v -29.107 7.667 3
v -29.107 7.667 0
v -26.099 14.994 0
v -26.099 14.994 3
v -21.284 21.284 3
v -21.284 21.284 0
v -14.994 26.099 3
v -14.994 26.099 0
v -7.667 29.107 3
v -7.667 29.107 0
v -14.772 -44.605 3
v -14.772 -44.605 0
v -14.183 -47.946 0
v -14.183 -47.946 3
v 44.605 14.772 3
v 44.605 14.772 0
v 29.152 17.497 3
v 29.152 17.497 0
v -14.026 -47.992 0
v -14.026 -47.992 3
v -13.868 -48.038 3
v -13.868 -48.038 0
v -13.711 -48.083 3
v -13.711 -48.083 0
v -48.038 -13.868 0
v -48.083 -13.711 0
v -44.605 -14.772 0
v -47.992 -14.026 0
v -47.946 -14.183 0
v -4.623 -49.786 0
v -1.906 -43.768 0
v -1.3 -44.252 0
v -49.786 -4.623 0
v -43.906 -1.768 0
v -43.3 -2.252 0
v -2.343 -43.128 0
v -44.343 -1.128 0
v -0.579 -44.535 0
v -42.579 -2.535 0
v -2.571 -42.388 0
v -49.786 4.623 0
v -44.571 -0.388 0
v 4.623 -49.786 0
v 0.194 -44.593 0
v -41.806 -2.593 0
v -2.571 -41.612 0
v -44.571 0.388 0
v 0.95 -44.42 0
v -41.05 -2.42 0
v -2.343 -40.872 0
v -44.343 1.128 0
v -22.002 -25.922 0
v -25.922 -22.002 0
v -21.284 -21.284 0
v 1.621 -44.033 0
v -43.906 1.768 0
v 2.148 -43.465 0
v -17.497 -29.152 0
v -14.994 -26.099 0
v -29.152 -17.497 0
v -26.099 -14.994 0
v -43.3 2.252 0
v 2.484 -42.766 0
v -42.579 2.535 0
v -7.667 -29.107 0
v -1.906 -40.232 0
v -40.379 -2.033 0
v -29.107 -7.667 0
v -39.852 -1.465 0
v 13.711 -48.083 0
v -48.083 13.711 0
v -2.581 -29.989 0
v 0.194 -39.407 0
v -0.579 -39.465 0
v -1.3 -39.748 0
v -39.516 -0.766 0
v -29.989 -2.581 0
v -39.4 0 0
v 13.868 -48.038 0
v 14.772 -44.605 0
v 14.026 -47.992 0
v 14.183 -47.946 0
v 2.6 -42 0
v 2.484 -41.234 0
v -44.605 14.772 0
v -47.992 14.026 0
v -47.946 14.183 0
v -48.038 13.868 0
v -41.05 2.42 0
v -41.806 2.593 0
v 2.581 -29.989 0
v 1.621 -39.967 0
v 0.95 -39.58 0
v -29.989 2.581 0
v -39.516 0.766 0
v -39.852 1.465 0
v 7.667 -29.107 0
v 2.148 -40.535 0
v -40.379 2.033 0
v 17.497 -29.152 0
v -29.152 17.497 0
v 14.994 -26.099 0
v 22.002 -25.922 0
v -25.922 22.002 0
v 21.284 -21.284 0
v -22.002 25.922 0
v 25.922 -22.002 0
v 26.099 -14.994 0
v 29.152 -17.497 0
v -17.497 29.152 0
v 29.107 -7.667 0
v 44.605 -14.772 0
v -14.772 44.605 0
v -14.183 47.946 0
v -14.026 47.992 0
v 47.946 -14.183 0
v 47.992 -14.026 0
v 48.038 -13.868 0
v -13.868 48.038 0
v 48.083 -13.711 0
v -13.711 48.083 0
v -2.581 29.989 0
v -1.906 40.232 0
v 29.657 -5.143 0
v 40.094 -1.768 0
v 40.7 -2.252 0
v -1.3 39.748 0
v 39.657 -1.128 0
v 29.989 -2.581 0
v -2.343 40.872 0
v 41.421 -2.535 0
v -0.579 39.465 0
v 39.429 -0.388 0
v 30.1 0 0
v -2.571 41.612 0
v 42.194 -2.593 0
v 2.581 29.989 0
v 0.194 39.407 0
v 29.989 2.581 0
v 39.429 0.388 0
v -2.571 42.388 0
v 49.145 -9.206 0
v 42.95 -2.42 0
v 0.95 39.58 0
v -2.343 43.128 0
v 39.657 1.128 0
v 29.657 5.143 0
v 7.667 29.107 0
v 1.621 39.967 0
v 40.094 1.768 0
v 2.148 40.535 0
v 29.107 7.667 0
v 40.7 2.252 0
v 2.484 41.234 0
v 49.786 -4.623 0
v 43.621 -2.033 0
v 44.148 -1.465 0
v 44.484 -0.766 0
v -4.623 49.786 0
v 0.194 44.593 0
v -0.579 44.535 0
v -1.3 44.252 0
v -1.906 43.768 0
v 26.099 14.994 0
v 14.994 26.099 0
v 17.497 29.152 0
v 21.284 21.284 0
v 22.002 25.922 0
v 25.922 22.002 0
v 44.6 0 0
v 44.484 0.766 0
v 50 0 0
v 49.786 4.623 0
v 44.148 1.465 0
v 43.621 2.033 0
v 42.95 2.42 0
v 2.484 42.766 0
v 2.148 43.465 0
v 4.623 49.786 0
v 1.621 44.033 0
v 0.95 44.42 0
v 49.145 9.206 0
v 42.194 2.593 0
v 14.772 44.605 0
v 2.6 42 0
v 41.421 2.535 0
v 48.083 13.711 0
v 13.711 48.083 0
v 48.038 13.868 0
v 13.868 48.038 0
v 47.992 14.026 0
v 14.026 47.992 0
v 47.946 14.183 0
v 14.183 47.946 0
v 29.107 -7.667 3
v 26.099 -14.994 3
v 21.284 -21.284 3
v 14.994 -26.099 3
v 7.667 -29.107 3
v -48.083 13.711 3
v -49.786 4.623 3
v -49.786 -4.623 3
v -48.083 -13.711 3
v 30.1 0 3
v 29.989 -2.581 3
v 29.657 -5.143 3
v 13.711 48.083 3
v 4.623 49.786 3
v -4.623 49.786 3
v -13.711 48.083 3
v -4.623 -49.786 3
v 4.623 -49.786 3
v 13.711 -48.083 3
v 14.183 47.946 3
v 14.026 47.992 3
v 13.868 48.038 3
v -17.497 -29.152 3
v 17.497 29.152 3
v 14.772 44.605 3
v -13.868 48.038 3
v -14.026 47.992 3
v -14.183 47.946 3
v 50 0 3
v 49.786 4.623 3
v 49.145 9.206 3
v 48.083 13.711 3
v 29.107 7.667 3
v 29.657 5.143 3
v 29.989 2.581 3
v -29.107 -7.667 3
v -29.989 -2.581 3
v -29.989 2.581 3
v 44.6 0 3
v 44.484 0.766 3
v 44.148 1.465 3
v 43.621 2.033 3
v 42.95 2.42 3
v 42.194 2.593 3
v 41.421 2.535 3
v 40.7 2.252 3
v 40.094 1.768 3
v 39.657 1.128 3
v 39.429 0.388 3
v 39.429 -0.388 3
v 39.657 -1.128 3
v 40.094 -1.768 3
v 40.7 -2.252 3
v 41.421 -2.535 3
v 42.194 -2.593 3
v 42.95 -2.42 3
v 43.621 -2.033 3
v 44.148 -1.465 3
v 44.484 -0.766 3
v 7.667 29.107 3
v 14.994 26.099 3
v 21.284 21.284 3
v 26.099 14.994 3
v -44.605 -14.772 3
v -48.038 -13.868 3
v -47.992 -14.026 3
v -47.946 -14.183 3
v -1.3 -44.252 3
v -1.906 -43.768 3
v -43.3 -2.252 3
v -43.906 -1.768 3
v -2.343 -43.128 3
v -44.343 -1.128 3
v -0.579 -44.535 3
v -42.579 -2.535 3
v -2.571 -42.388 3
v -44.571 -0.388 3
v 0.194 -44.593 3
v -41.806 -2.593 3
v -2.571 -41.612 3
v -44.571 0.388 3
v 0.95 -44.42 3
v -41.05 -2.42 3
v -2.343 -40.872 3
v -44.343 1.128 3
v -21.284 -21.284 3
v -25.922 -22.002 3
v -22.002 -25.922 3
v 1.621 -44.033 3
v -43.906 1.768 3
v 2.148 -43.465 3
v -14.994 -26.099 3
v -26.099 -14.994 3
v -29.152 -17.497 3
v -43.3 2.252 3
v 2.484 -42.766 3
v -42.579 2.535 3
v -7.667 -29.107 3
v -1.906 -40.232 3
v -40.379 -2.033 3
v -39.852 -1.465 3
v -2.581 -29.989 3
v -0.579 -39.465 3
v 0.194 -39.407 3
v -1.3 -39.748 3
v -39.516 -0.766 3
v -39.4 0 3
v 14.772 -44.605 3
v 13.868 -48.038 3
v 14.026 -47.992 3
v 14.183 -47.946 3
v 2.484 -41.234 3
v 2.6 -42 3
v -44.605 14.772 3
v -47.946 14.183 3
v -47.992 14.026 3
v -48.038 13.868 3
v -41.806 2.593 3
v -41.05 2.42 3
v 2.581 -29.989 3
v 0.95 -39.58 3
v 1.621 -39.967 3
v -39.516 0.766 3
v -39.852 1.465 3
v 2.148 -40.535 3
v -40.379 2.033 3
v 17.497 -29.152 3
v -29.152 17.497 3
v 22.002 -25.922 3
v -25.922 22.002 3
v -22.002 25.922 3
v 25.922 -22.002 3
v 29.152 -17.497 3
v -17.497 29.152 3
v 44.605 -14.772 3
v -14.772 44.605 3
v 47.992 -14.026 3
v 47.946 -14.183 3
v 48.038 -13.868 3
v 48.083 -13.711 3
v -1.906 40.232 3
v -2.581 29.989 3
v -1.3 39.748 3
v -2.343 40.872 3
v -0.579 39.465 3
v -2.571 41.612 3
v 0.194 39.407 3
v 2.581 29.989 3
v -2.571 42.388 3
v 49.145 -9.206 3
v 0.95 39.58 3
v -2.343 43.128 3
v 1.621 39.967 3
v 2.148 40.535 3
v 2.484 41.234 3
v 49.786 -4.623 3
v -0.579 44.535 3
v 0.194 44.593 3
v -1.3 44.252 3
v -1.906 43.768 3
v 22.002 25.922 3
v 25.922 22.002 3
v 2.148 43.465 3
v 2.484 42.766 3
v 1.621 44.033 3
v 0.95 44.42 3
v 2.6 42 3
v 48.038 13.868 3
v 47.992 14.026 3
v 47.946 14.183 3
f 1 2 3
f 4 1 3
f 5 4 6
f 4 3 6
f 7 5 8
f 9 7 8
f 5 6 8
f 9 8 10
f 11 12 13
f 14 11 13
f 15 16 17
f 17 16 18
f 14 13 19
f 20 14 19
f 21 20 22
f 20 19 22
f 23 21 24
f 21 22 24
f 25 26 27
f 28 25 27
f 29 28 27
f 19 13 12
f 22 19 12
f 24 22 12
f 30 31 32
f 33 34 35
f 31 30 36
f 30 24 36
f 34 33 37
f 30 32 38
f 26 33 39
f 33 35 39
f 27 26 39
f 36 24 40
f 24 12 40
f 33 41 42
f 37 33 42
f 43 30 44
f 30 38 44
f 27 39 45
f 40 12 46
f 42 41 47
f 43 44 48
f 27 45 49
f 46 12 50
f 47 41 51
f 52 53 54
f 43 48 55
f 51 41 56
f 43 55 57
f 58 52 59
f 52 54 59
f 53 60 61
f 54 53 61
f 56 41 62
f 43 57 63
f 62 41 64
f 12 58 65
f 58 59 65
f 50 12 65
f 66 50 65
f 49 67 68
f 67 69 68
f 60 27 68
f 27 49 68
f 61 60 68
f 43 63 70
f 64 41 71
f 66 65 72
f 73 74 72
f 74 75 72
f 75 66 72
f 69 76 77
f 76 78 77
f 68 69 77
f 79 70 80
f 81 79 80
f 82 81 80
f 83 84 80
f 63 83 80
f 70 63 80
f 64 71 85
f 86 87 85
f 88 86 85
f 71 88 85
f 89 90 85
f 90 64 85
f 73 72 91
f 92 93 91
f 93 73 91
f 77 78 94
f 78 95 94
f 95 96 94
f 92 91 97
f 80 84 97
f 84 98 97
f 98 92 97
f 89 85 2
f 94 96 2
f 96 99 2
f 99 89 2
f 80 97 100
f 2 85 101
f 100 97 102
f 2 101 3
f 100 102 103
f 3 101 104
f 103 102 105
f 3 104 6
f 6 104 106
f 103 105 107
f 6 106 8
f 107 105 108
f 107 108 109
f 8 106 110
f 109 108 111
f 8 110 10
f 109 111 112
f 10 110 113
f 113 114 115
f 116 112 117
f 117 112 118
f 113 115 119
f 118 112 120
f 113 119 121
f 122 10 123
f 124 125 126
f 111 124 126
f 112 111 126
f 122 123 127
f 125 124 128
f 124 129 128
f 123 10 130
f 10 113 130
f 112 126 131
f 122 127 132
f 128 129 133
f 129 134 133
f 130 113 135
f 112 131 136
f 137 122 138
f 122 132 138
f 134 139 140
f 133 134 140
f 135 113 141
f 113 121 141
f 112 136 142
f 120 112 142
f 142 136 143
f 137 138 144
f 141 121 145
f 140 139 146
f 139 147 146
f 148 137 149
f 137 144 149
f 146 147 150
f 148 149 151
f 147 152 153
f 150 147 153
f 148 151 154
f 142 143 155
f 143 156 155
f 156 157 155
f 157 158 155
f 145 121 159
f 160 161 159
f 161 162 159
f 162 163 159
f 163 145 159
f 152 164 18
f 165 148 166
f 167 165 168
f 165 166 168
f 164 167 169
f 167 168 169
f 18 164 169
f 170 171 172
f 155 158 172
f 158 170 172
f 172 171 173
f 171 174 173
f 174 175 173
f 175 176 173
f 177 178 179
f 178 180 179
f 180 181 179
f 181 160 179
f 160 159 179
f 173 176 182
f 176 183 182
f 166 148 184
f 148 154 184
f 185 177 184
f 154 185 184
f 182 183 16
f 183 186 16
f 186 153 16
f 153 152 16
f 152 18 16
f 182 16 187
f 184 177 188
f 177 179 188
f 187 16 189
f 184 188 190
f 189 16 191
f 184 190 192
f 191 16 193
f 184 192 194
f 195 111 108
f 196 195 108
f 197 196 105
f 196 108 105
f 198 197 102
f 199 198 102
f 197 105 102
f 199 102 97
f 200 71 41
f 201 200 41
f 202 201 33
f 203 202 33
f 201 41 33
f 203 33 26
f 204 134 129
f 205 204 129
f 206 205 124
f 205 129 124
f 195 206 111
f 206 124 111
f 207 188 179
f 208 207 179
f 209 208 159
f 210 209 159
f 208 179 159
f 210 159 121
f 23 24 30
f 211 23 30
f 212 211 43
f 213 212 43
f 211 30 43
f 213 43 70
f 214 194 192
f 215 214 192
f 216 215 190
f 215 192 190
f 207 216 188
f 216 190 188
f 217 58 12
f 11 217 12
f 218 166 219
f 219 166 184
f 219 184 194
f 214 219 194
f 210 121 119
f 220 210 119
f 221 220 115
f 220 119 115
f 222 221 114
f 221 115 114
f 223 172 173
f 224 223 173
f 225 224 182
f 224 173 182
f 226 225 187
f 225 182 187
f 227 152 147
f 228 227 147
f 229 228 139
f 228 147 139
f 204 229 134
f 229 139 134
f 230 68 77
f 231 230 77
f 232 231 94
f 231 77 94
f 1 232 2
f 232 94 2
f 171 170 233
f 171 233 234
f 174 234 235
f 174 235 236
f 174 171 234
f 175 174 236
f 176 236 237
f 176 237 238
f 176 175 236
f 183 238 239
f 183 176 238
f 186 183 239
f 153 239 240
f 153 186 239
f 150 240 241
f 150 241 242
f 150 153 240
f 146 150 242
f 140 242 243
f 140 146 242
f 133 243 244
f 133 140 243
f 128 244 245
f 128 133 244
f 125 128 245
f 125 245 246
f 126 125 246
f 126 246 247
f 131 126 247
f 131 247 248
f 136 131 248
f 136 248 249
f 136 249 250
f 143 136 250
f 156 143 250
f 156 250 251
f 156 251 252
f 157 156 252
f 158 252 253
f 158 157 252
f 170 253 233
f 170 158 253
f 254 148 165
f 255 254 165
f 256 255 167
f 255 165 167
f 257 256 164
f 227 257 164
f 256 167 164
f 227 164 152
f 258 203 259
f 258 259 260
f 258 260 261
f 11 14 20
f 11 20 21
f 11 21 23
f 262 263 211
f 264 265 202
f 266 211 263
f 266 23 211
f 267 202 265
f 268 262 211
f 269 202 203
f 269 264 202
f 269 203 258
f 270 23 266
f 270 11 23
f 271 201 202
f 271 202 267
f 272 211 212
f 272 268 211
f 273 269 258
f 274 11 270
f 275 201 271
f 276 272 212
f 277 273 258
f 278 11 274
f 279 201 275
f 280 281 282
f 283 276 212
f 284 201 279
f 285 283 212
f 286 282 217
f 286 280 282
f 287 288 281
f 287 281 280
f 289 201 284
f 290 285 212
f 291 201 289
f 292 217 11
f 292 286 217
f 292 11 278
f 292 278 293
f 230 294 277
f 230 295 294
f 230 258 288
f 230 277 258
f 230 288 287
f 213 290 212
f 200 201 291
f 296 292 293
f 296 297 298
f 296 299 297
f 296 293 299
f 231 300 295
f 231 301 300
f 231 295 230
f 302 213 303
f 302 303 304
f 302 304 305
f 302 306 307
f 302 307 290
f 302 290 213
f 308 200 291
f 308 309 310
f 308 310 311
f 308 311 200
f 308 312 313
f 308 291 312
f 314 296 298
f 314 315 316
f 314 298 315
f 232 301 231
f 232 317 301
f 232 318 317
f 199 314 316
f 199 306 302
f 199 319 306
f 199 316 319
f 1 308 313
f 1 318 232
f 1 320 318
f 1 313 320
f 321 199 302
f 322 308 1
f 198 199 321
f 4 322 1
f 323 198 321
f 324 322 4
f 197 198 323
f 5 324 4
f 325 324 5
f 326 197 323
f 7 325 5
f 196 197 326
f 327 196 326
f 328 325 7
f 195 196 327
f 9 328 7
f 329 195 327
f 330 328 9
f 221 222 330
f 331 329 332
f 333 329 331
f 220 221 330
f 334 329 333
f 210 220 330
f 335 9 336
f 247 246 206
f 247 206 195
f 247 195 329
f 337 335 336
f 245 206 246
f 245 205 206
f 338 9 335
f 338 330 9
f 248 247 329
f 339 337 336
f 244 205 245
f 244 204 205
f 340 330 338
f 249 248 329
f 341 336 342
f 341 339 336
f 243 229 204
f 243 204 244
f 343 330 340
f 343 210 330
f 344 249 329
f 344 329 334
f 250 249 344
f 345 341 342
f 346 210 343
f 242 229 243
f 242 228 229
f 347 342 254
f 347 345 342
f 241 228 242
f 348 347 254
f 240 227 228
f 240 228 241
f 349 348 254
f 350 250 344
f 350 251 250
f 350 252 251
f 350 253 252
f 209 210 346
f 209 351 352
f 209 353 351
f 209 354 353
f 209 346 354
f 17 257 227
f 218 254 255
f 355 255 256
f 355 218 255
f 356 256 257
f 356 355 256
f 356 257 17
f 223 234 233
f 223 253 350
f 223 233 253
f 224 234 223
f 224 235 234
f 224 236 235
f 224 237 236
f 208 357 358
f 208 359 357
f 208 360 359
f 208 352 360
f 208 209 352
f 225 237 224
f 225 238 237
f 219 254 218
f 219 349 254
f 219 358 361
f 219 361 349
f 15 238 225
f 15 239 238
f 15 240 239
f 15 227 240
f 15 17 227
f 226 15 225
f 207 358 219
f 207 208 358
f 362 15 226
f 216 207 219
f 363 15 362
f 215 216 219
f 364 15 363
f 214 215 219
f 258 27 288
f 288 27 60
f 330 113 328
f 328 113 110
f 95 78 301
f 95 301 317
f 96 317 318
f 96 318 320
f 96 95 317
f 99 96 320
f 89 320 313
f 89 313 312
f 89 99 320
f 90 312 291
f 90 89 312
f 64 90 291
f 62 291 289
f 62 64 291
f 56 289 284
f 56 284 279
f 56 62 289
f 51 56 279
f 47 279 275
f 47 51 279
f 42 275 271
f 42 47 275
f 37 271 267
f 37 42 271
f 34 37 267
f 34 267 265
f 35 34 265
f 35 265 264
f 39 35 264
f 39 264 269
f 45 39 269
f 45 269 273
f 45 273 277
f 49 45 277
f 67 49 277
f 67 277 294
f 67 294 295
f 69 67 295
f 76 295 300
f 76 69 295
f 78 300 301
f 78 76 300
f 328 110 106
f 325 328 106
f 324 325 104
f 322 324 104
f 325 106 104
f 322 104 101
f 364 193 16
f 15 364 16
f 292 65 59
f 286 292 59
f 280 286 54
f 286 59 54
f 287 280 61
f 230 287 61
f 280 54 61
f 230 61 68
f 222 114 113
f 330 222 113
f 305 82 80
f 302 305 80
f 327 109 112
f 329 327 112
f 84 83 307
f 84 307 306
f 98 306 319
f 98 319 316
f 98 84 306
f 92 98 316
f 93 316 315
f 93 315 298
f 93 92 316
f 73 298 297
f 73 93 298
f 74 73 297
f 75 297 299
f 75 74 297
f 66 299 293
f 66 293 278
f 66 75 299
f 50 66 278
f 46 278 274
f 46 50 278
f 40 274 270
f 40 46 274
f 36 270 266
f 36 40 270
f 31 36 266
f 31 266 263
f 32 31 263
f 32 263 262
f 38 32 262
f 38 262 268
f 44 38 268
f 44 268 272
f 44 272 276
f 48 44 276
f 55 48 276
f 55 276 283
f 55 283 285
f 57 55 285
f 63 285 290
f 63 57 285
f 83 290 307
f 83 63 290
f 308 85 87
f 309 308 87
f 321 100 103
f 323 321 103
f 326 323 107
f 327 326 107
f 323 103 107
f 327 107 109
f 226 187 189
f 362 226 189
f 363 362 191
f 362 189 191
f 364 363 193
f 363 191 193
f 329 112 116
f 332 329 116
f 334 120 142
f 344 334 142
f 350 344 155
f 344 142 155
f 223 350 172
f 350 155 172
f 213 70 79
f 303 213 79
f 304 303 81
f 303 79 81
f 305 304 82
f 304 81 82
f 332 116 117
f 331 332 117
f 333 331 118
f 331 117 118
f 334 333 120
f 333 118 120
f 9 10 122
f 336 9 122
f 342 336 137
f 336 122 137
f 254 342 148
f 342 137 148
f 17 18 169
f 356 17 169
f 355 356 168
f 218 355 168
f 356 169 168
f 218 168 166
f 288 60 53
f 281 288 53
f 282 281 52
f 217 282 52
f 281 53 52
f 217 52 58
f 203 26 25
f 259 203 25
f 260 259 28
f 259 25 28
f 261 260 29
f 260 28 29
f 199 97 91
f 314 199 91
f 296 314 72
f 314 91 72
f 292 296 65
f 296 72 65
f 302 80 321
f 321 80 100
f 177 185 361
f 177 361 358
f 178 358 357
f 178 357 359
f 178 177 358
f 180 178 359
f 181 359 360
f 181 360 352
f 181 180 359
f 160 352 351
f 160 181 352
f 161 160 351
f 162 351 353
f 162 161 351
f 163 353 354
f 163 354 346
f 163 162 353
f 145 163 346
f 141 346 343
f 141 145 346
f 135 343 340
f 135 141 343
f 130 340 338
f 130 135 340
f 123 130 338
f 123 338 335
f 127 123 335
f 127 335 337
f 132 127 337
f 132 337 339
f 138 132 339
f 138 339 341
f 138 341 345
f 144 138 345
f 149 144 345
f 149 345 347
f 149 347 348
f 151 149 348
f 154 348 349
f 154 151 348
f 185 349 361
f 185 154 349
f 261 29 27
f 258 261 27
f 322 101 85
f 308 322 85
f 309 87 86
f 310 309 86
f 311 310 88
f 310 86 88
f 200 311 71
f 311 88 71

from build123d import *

# Parameters (mm, degrees)
F0_R     = 2.6
F1_DEPTH = 3


with BuildPart() as f1:
    # F0 (on Top) → F1 (new body)
    with BuildSketch(Plane.XY):
        with BuildLine():
            ThreePointArc((-29.1072619048, 7.6666357946), (-21.2839141137, 21.2839141137), (-7.6666357946, 29.1072619048))
            ThreePointArc((-7.6666357946, 29.1072619048), (-9.5767893278, 30.4550831025), (-11.2543201582, 32.0833333333))
            ThreePointArc((-11.2543201582, 32.0833333333), (-14.4500509711, 30.7765499518), (-17.4967765305, 29.1524066081))
            ThreePointArc((-17.4967765305, 29.1524066081), (-24.0416305603, 24.0416305603), (-29.1524066081, 17.4967765305))
            ThreePointArc((-29.1524066081, 17.4967765305), (-30.7765499518, 14.4500509711), (-32.0833333333, 11.2543201582))
            ThreePointArc((-32.0833333333, 11.2543201582), (-30.4550831025, 9.5767893278), (-29.1072619048, 7.6666357946))
        make_face()
        with BuildLine():
            ThreePointArc((-17.4967765305, 29.1524066081), (-14.4500509711, 30.7765499518), (-11.2543201582, 32.0833333333))
            ThreePointArc((-11.2543201582, 32.0833333333), (-14.4409191932, 37.9429255793), (-14.7721162582, 44.6047228746))
            Line((-14.7721162582, 44.6047228746), (-17.4967765305, 29.1524066081))
        make_face()
        with BuildLine():
            ThreePointArc((-11.2543201582, 32.0833333333), (0, 34), (11.2543201582, 32.0833333333))
            ThreePointArc((11.2543201582, 32.0833333333), (14.0323697637, 36.6997548346), (15, 42))
            ThreePointArc((15, 42), (14.942920488, 43.3073359512), (14.7721163614, 44.6047222892))
            ThreePointArc((14.7721163614, 44.6047222892), (14.3474025552, 46.3763043677), (13.7110559606, 48.0833333333))
            ThreePointArc((13.7110559606, 48.0833333333), (0, 50), (-13.7110559606, 48.0833333333))
            ThreePointArc((-13.7110559606, 48.0833333333), (-14.3474024685, 46.376304652), (-14.7721162582, 44.6047228746))
            ThreePointArc((-14.7721162582, 44.6047228746), (-14.4409191932, 37.9429255793), (-11.2543201582, 32.0833333333))
        make_face()
        with Locations((0, 42)):
            Circle(F0_R, mode=Mode.SUBTRACT)
        with BuildLine():
            ThreePointArc((15, 42), (14.0323697637, 36.6997548346), (11.2543201582, 32.0833333333))
            ThreePointArc((11.2543201582, 32.0833333333), (14.4500509711, 30.7765499518), (17.4967765305, 29.1524066081))
            Line((17.4967765305, 29.1524066081), (14.7721163614, 44.6047222892))
            ThreePointArc((14.7721163614, 44.6047222892), (14.942920488, 43.3073359512), (15, 42))
        make_face()
        with BuildLine():
            ThreePointArc((-7.6666357946, 29.1072619048), (0, 30.1), (7.6666357946, 29.1072619048))
            ThreePointArc((7.6666357946, 29.1072619048), (9.5767893278, 30.4550831025), (11.2543201582, 32.0833333333))
            ThreePointArc((11.2543201582, 32.0833333333), (0, 34), (-11.2543201582, 32.0833333333))
            ThreePointArc((-11.2543201582, 32.0833333333), (-9.5767893278, 30.4550831025), (-7.6666357946, 29.1072619048))
        make_face()
        with BuildLine():
            ThreePointArc((7.6666357946, 29.1072619048), (21.2839141137, 21.2839141137), (29.1072619048, 7.6666357946))
            ThreePointArc((29.1072619048, 7.6666357946), (30.4550831025, 9.5767893278), (32.0833333333, 11.2543201582))
            ThreePointArc((32.0833333333, 11.2543201582), (30.7765499518, 14.4500509711), (29.1524066081, 17.4967765305))
            ThreePointArc((29.1524066081, 17.4967765305), (24.0416305603, 24.0416305603), (17.4967765305, 29.1524066081))
            ThreePointArc((17.4967765305, 29.1524066081), (14.4500509711, 30.7765499518), (11.2543201582, 32.0833333333))
            ThreePointArc((11.2543201582, 32.0833333333), (9.5767893278, 30.4550831025), (7.6666357946, 29.1072619048))
        make_face()
        with BuildLine():
            ThreePointArc((29.1524066081, 17.4967765305), (30.7765499518, 14.4500509711), (32.0833333333, 11.2543201582))
            ThreePointArc((32.0833333333, 11.2543201582), (37.9429254774, 14.4409191646), (44.6047226662, 14.772116295))
            Line((44.6047226662, 14.772116295), (29.1524066081, 17.4967765305))
        make_face()
        with BuildLine():
            ThreePointArc((44.6047226662, 14.772116295), (37.9429254774, 14.4409191646), (32.0833333333, 11.2543201582))
            ThreePointArc((32.0833333333, 11.2543201582), (33.5174084121, 5.7081812632), (34, 0))
            ThreePointArc((34, 0), (33.5174084121, -5.7081812632), (32.0833333333, -11.2543201582))
            ThreePointArc((32.0833333333, -11.2543201582), (37.9429254774, -14.4409191646), (44.6047226662, -14.772116295))
            ThreePointArc((44.6047226662, -14.772116295), (46.3763045508, -14.3474024994), (48.0833333333, -13.7110559606))
            ThreePointArc((48.0833333333, -13.7110559606), (49.5185150558, -6.9221865524), (50, 0))
            ThreePointArc((50, 0), (49.5185150558, 6.9221865524), (48.0833333333, 13.7110559606))
            ThreePointArc((48.0833333333, 13.7110559606), (46.3763045508, 14.3474024994), (44.6047226662, 14.772116295))
        make_face()
        with Locations((42, 0)):
            Circle(F0_R, mode=Mode.SUBTRACT)
        with BuildLine():
            Line((-14.182910918, 47.9462724087), (-14.7721162582, 44.6047228746))
            ThreePointArc((-14.7721162582, 44.6047228746), (-14.3474024685, 46.376304652), (-13.7110559606, 48.0833333333))
            ThreePointArc((-13.7110559606, 48.0833333333), (-13.9471518053, 48.0153824989), (-14.182910918, 47.9462724087))
        make_face()
        with BuildLine():
            ThreePointArc((13.7110559606, 48.0833333333), (14.3474025552, 46.3763043677), (14.7721163614, 44.6047222892))
            Line((14.7721163614, 44.6047222892), (14.182910918, 47.9462724087))
            ThreePointArc((14.182910918, 47.9462724087), (13.9471518053, 48.0153824989), (13.7110559606, 48.0833333333))
        make_face()
        with BuildLine():
            ThreePointArc((44.6047226662, -14.772116295), (37.9429254774, -14.4409191646), (32.0833333333, -11.2543201582))
            ThreePointArc((32.0833333333, -11.2543201582), (30.7765499518, -14.4500509711), (29.1524066081, -17.4967765305))
            Line((29.1524066081, -17.4967765305), (44.6047226662, -14.772116295))
        make_face()
        with BuildLine():
            ThreePointArc((32.0833333333, -11.2543201582), (30.4550831025, -9.5767893278), (29.1072619048, -7.6666357946))
            ThreePointArc((29.1072619048, -7.6666357946), (21.2839141137, -21.2839141137), (7.6666357946, -29.1072619048))
            ThreePointArc((7.6666357946, -29.1072619048), (9.5767893278, -30.4550831025), (11.2543201582, -32.0833333333))
            ThreePointArc((11.2543201582, -32.0833333333), (14.4500509711, -30.7765499518), (17.4967765305, -29.1524066081))
            ThreePointArc((17.4967765305, -29.1524066081), (24.0416305603, -24.0416305603), (29.1524066081, -17.4967765305))
            ThreePointArc((29.1524066081, -17.4967765305), (30.7765499518, -14.4500509711), (32.0833333333, -11.2543201582))
        make_face()
        with BuildLine():
            ThreePointArc((29.1072619048, 7.6666357946), (29.8507837697, 3.8653212458), (30.1, 0))
            ThreePointArc((30.1, 0), (29.8507837697, -3.8653212458), (29.1072619048, -7.6666357946))
            ThreePointArc((29.1072619048, -7.6666357946), (30.4550831025, -9.5767893278), (32.0833333333, -11.2543201582))
            ThreePointArc((32.0833333333, -11.2543201582), (33.5174084121, -5.7081812632), (34, 0))
            ThreePointArc((34, 0), (33.5174084121, 5.7081812632), (32.0833333333, 11.2543201582))
            ThreePointArc((32.0833333333, 11.2543201582), (30.4550831025, 9.5767893278), (29.1072619048, 7.6666357946))
        make_face()
        with BuildLine():
            ThreePointArc((48.0833333333, -13.7110559606), (46.3763045508, -14.3474024994), (44.6047226662, -14.772116295))
            Line((44.6047226662, -14.772116295), (47.9462724087, -14.182910918))
            ThreePointArc((47.9462724087, -14.182910918), (48.0153824989, -13.9471518053), (48.0833333333, -13.7110559606))
        make_face()
        with BuildLine():
            Line((47.9462724087, 14.182910918), (44.6047226662, 14.772116295))
            ThreePointArc((44.6047226662, 14.772116295), (46.3763045508, 14.3474024994), (48.0833333333, 13.7110559606))
            ThreePointArc((48.0833333333, 13.7110559606), (48.0153824989, 13.9471518053), (47.9462724087, 14.182910918))
        make_face()
        with BuildLine():
            ThreePointArc((11.2543201582, -32.0833333333), (9.5767893278, -30.4550831025), (7.6666357946, -29.1072619048))
            ThreePointArc((7.6666357946, -29.1072619048), (0, -30.1), (-7.6666357946, -29.1072619048))
            ThreePointArc((-7.6666357946, -29.1072619048), (-9.5767893278, -30.4550831025), (-11.2543201582, -32.0833333333))
            ThreePointArc((-11.2543201582, -32.0833333333), (0, -34), (11.2543201582, -32.0833333333))
        make_face()
        with BuildLine():
            ThreePointArc((15, -42), (14.0323697637, -36.6997548346), (11.2543201582, -32.0833333333))
            ThreePointArc((11.2543201582, -32.0833333333), (0, -34), (-11.2543201582, -32.0833333333))
            ThreePointArc((-11.2543201582, -32.0833333333), (-14.4409191558, -37.942925446), (-14.7721163063, -44.6047226018))
            ThreePointArc((-14.7721163063, -44.6047226018), (-14.3474025089, -46.3763045195), (-13.7110559606, -48.0833333333))
            ThreePointArc((-13.7110559606, -48.0833333333), (0, -50), (13.7110559606, -48.0833333333))
            ThreePointArc((13.7110559606, -48.0833333333), (14.3474024994, -46.3763045508), (14.772116295, -44.6047226662))
            ThreePointArc((14.772116295, -44.6047226662), (14.9429204713, -43.3073361418), (15, -42))
        make_face()
        with Locations((0, -42)):
            Circle(F0_R, mode=Mode.SUBTRACT)
        with BuildLine():
            ThreePointArc((-14.7721163063, -44.6047226018), (-14.4409191558, -37.942925446), (-11.2543201582, -32.0833333333))
            ThreePointArc((-11.2543201582, -32.0833333333), (-14.4500509711, -30.7765499518), (-17.4967765305, -29.1524066081))
            Line((-17.4967765305, -29.1524066081), (-14.7721163063, -44.6047226018))
        make_face()
        with BuildLine():
            ThreePointArc((-11.2543201582, -32.0833333333), (-9.5767893278, -30.4550831025), (-7.6666357946, -29.1072619048))
            ThreePointArc((-7.6666357946, -29.1072619048), (-21.2839141137, -21.2839141137), (-29.1072619048, -7.6666357946))
            ThreePointArc((-29.1072619048, -7.6666357946), (-30.4550831025, -9.5767893278), (-32.0833333333, -11.2543201582))
            ThreePointArc((-32.0833333333, -11.2543201582), (-30.7765499518, -14.4500509711), (-29.1524066081, -17.4967765305))
            ThreePointArc((-29.1524066081, -17.4967765305), (-24.0416305603, -24.0416305603), (-17.4967765305, -29.1524066081))
            ThreePointArc((-17.4967765305, -29.1524066081), (-14.4500509711, -30.7765499518), (-11.2543201582, -32.0833333333))
        make_face()
        with BuildLine():
            ThreePointArc((17.4967765305, -29.1524066081), (14.4500509711, -30.7765499518), (11.2543201582, -32.0833333333))
            ThreePointArc((11.2543201582, -32.0833333333), (14.0323697637, -36.6997548346), (15, -42))
            ThreePointArc((15, -42), (14.9429204713, -43.3073361418), (14.772116295, -44.6047226662))
            Line((14.772116295, -44.6047226662), (17.4967765305, -29.1524066081))
        make_face()
        with BuildLine():
            Line((14.182910918, -47.9462724087), (14.772116295, -44.6047226662))
            ThreePointArc((14.772116295, -44.6047226662), (14.3474024994, -46.3763045508), (13.7110559606, -48.0833333333))
            ThreePointArc((13.7110559606, -48.0833333333), (13.9471518053, -48.0153824989), (14.182910918, -47.9462724087))
        make_face()
        with BuildLine():
            ThreePointArc((-13.7110559606, -48.0833333333), (-14.3474025089, -46.3763045195), (-14.7721163063, -44.6047226018))
            Line((-14.7721163063, -44.6047226018), (-14.182910918, -47.9462724087))
            ThreePointArc((-14.182910918, -47.9462724087), (-13.9471518053, -48.0153824989), (-13.7110559606, -48.0833333333))
        make_face()
        with BuildLine():
            ThreePointArc((-32.0833333333, -11.2543201582), (-34, 0), (-32.0833333333, 11.2543201582))
            ThreePointArc((-32.0833333333, 11.2543201582), (-37.9429254774, 14.4409191646), (-44.6047226662, 14.772116295))
            ThreePointArc((-44.6047226662, 14.772116295), (-46.3763045508, 14.3474024994), (-48.0833333333, 13.7110559606))
            ThreePointArc((-48.0833333333, 13.7110559606), (-50, 0), (-48.0833333333, -13.7110559606))
            ThreePointArc((-48.0833333333, -13.7110559606), (-46.3763045508, -14.3474024994), (-44.6047226662, -14.772116295))
            ThreePointArc((-44.6047226662, -14.772116295), (-37.9429254774, -14.4409191646), (-32.0833333333, -11.2543201582))
        make_face()
        with Locations((-42, 0)):
            Circle(F0_R, mode=Mode.SUBTRACT)
        with BuildLine():
            ThreePointArc((-29.1524066081, -17.4967765305), (-30.7765499518, -14.4500509711), (-32.0833333333, -11.2543201582))
            ThreePointArc((-32.0833333333, -11.2543201582), (-37.9429254774, -14.4409191646), (-44.6047226662, -14.772116295))
            Line((-44.6047226662, -14.772116295), (-29.1524066081, -17.4967765305))
        make_face()
        with BuildLine():
            ThreePointArc((-29.1072619048, -7.6666357946), (-30.1, 0), (-29.1072619048, 7.6666357946))
            ThreePointArc((-29.1072619048, 7.6666357946), (-30.4550831025, 9.5767893278), (-32.0833333333, 11.2543201582))
            ThreePointArc((-32.0833333333, 11.2543201582), (-34, 0), (-32.0833333333, -11.2543201582))
            ThreePointArc((-32.0833333333, -11.2543201582), (-30.4550831025, -9.5767893278), (-29.1072619048, -7.6666357946))
        make_face()
        with BuildLine():
            ThreePointArc((-44.6047226662, 14.772116295), (-37.9429254774, 14.4409191646), (-32.0833333333, 11.2543201582))
            ThreePointArc((-32.0833333333, 11.2543201582), (-30.7765499518, 14.4500509711), (-29.1524066081, 17.4967765305))
            Line((-29.1524066081, 17.4967765305), (-44.6047226662, 14.772116295))
        make_face()
        with BuildLine():
            ThreePointArc((-48.0833333333, 13.7110559606), (-46.3763045508, 14.3474024994), (-44.6047226662, 14.772116295))
            Line((-44.6047226662, 14.772116295), (-47.9462724087, 14.182910918))
            ThreePointArc((-47.9462724087, 14.182910918), (-48.0153824989, 13.9471518053), (-48.0833333333, 13.7110559606))
        make_face()
        with BuildLine():
            Line((-47.9462724087, -14.182910918), (-44.6047226662, -14.772116295))
            ThreePointArc((-44.6047226662, -14.772116295), (-46.3763045508, -14.3474024994), (-48.0833333333, -13.7110559606))
            ThreePointArc((-48.0833333333, -13.7110559606), (-48.0153824989, -13.9471518053), (-47.9462724087, -14.182910918))
        make_face()
    extrude(amount=F1_DEPTH)


solid = f1.part
